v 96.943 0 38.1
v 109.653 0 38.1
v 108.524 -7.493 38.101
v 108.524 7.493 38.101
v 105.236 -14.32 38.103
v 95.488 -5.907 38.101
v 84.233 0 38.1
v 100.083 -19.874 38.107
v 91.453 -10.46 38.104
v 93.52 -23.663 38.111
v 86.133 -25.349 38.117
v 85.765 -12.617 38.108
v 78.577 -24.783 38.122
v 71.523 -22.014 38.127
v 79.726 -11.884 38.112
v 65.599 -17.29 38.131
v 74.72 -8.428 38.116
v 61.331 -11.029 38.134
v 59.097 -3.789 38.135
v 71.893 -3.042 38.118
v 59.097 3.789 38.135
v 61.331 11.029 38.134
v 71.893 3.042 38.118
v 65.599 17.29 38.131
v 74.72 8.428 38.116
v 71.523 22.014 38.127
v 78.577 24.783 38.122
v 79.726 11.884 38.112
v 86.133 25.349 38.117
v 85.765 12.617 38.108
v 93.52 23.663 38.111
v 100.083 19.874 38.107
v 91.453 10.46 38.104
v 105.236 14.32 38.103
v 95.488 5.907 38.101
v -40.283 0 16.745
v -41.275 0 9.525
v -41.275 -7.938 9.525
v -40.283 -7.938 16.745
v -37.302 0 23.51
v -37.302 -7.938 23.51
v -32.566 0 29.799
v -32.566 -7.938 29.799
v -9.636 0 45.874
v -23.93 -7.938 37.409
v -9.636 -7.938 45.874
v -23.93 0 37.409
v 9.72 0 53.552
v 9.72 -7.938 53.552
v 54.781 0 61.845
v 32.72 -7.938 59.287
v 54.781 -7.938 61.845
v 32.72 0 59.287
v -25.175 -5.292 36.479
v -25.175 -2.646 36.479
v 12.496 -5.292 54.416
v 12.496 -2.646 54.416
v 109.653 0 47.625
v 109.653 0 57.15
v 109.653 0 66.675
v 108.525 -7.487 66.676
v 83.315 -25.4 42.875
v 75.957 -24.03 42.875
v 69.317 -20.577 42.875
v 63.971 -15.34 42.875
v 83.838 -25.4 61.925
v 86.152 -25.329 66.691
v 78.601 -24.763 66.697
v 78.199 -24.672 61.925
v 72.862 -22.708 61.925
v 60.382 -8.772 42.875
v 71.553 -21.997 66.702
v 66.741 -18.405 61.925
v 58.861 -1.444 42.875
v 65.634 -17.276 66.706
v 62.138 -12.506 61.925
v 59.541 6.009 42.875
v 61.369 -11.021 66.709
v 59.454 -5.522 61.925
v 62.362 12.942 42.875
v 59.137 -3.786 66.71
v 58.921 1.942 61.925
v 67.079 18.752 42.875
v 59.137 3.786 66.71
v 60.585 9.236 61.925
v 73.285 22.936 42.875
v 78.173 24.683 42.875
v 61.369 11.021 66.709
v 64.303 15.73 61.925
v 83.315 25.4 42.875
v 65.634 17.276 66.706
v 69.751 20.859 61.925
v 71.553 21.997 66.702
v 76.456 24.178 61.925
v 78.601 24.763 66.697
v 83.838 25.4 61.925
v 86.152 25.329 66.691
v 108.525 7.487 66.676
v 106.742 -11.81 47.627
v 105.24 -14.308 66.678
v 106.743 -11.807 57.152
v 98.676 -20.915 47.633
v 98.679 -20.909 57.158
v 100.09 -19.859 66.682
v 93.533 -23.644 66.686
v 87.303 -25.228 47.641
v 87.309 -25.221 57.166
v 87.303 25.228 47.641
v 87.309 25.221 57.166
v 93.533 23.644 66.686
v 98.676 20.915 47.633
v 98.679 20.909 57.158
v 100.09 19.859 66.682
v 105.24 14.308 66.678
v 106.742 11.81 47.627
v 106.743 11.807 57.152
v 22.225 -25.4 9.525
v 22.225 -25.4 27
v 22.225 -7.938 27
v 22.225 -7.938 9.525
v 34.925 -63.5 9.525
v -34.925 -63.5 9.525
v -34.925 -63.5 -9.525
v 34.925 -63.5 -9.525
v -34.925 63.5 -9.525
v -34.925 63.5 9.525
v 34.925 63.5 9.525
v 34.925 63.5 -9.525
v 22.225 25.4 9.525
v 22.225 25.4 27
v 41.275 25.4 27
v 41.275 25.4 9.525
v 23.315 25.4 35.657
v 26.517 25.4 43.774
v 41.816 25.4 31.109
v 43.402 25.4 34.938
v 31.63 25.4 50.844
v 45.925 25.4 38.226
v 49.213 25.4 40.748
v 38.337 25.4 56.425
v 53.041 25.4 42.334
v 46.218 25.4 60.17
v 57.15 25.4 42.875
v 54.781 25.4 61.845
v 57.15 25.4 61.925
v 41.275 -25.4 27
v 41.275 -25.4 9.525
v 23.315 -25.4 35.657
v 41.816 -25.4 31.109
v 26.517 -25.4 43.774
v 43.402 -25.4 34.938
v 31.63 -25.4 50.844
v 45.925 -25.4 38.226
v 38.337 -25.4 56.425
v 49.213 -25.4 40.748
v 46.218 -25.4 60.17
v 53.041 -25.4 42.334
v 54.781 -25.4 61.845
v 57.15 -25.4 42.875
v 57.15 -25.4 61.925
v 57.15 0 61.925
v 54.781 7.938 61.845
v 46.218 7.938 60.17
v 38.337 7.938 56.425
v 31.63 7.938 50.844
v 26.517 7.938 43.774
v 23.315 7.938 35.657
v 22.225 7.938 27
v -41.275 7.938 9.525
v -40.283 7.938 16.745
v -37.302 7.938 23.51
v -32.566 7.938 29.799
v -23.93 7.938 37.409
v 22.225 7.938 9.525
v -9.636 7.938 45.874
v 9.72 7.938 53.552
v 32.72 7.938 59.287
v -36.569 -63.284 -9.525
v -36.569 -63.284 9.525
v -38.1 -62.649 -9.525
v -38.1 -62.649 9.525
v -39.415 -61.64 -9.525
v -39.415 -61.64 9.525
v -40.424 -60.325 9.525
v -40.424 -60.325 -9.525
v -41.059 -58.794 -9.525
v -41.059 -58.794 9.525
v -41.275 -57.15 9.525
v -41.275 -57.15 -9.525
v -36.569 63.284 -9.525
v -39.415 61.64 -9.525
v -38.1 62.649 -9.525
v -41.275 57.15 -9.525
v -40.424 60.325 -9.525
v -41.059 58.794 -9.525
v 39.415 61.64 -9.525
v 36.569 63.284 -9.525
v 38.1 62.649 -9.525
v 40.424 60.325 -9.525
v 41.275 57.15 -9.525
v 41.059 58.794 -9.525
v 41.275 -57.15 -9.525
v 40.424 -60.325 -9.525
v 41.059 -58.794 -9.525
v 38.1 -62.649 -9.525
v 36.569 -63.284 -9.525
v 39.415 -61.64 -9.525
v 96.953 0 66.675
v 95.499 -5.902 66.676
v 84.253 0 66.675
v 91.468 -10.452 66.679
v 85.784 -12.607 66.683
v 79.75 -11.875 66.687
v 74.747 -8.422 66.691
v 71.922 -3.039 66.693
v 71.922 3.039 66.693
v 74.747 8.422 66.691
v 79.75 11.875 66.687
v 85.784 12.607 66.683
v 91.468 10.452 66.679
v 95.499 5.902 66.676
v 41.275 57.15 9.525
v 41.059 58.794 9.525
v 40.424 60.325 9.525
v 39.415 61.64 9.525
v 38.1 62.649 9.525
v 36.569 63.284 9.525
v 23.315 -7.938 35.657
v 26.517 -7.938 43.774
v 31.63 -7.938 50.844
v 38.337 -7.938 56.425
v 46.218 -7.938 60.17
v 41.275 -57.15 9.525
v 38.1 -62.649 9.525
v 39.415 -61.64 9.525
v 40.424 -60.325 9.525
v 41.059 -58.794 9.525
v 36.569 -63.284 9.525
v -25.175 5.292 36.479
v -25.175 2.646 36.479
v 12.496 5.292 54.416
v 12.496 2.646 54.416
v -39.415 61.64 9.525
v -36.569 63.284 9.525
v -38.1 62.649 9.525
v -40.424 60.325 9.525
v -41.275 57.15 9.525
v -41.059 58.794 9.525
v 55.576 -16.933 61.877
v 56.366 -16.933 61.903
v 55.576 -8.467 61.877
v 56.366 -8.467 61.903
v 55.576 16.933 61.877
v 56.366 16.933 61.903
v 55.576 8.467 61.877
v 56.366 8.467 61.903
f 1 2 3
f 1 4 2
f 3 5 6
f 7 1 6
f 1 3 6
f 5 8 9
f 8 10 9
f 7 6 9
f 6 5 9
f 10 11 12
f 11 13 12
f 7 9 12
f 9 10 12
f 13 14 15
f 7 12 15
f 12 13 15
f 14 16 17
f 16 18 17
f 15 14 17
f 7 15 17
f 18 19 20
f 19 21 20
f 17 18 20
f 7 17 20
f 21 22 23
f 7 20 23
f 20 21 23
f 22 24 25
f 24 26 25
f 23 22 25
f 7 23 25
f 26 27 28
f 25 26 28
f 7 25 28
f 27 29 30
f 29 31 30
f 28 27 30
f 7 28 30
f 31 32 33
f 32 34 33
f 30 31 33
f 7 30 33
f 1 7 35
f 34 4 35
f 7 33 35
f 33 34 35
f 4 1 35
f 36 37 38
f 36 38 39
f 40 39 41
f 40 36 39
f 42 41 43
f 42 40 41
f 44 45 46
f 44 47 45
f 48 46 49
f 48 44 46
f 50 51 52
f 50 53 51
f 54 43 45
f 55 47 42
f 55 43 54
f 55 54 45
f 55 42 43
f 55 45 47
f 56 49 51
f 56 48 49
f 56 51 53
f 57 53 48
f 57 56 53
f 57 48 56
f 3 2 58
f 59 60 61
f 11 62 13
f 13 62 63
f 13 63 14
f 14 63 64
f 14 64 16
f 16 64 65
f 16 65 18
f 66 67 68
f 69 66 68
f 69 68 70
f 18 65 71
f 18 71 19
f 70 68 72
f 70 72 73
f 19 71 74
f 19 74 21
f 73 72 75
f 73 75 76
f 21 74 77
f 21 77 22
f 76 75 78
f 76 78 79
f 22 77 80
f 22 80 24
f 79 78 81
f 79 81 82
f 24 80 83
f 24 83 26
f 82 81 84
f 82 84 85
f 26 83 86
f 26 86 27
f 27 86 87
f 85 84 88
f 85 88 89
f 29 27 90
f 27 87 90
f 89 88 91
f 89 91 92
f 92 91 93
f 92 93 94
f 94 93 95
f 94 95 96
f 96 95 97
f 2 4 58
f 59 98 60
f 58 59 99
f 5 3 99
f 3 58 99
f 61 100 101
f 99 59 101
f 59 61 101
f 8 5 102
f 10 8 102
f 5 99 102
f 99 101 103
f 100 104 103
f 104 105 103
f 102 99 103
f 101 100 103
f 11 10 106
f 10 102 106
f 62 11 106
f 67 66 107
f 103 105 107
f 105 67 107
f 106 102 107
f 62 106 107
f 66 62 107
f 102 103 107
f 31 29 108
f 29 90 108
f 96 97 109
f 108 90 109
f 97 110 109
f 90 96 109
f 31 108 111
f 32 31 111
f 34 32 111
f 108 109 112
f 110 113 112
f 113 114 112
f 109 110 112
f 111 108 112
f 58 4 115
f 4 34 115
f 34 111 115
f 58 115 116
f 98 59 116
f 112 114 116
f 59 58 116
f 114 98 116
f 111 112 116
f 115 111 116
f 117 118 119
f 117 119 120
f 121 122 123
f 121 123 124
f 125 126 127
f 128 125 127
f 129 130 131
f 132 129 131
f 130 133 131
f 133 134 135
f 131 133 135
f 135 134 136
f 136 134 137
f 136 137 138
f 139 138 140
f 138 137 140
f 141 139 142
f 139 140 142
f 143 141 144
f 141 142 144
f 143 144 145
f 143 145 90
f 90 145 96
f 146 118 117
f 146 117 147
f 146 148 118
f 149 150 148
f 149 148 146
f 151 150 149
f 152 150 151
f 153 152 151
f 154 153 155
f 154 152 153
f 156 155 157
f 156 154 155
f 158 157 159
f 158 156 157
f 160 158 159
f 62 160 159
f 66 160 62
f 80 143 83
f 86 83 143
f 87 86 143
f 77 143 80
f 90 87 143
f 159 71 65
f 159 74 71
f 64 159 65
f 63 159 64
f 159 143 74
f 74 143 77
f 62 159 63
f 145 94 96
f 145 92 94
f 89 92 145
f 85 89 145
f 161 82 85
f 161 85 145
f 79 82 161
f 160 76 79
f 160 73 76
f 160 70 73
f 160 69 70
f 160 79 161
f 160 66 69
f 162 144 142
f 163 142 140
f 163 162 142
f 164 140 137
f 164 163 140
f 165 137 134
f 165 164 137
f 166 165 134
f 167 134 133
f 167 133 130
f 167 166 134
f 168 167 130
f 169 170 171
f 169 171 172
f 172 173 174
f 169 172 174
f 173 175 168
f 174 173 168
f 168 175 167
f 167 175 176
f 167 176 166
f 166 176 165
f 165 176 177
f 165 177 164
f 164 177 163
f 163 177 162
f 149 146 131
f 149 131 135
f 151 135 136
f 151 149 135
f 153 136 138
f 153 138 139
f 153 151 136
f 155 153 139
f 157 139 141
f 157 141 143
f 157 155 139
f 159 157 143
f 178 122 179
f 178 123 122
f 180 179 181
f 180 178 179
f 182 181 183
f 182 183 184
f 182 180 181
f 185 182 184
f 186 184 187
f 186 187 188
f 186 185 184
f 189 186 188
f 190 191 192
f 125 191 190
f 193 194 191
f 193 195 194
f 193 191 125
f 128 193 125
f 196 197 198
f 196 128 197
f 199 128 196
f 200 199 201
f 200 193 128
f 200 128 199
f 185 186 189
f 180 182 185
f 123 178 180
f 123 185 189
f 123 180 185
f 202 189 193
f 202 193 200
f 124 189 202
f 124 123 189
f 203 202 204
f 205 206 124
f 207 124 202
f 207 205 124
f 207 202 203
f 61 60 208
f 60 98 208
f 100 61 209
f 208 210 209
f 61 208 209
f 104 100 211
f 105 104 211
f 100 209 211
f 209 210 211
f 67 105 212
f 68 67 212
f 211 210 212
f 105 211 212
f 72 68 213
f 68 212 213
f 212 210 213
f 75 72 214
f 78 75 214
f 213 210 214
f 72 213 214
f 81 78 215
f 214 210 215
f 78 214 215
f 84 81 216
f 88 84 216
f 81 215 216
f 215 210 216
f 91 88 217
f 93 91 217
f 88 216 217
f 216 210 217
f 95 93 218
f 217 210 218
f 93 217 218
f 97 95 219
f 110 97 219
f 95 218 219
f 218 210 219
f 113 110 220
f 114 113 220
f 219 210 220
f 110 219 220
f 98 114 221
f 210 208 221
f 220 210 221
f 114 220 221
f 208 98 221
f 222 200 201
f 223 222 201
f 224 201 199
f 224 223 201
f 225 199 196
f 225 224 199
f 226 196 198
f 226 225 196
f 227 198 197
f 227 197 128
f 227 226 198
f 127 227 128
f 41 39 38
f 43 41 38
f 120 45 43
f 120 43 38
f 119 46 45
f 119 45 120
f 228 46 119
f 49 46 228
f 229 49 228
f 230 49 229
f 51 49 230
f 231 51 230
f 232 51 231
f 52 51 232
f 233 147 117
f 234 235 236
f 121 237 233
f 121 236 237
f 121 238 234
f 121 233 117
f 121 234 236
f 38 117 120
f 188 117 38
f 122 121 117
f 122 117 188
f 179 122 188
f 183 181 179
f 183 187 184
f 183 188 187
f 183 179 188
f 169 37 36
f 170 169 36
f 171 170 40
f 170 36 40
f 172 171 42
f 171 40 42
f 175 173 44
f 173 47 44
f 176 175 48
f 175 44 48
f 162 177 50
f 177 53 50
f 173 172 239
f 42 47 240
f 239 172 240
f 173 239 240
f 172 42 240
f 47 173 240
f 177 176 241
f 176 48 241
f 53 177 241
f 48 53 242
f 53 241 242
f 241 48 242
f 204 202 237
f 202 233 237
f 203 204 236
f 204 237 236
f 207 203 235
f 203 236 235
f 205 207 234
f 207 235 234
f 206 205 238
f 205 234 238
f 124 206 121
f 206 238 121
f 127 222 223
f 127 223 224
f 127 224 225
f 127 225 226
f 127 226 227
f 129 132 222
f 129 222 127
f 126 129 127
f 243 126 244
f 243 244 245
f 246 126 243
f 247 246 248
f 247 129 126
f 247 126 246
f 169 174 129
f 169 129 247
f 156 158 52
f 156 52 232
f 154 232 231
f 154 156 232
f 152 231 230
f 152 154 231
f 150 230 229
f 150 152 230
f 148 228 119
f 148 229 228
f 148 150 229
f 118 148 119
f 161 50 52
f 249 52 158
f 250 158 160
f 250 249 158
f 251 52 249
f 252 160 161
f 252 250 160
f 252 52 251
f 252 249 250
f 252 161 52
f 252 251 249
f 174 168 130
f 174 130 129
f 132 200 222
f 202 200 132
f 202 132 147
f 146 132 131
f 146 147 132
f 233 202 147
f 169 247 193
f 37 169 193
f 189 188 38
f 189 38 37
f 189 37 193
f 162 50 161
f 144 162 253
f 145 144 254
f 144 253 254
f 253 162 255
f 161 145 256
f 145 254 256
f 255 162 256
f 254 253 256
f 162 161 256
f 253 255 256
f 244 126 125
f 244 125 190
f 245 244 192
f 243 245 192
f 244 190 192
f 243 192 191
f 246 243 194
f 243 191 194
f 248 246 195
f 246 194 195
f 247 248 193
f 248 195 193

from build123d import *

# Parameters (mm, degrees)
F1_DEPTH = 63.5
F0_W     = 25.3799454411
F0_H     = 19.05
F2_DEPTH = 25.4
F3_DEPTH = 7.9375
F5_R     = 6.35


with BuildPart() as f1:
    # F0 (on Front) → F1 (new body, symmetric)
    with BuildSketch(Plane.XZ):
        Polygon((41.275, -9.525), (41.275, 9.525), (22.225, 9.525), (-41.275, 9.525), (-41.275, -9.525), align=None)
    extrude(amount=F1_DEPTH, both=True)

    # F0 (on Front) → F2 (join, symmetric)
    with BuildSketch(Plane.XZ):
        with BuildLine():
            Line((22.225, 9.525), (41.275, 9.525))
            Line((41.275, 9.525), (41.275, 27.0002))
            ThreePointArc((41.275, 27.0002), (45.9246798487, 38.2255201513), (57.15, 42.8752))
            Line((57.15, 42.8752), (58.853423, 42.8752))
            Line((58.853423, 42.8752), (58.853423, 61.9252))
            Line((58.853423, 61.9252), (57.15, 61.9252))
            add(Edge.make_bspline(
                [(54.7810867094, 61.8447673645), (55.5787107168, 61.8791484879), (56.3685670715, 61.9059785826), (57.15, 61.9252)],
                knots=[109.2664103078, 109.2664103078, 109.2664103078, 109.2664103078, 111.5045361635, 111.5045361635, 111.5045361635, 111.5045361635], degree=3))
            ThreePointArc((54.7810867094, 61.8447673645), (31.6304984211, 50.8436616648), (22.225, 27.0002))
            Line((22.225, 27.0002), (22.225, 9.525))
        make_face()
        with Locations((71.5433957206, 52.4002)):
            Rectangle(F0_W, F0_H)
    extrude(amount=F2_DEPTH, both=True)

    # F0 (on Front) → F3 (join, symmetric)
    with BuildSketch(Plane.XZ):
        with BuildLine():
            Line((-41.275, 9.525), (22.225, 9.525))
            Line((22.225, 9.525), (22.225, 27.0002))
            ThreePointArc((22.225, 27.0002), (31.6304984211, 50.8436616648), (54.7810867094, 61.8447673645))
            add(Edge.make_bspline(
                [(-41.275, 9.525), (-41.6134486644, 40.4903317988), (15.8406885003, 60.1662639324), (54.7810867094, 61.8447673645)],
                knots=[0, 0, 0, 0, 109.2664103078, 109.2664103078, 109.2664103078, 109.2664103078], degree=3))
        make_face()
    extrude(amount=F3_DEPTH, both=True)

    # F0 (on Front) → F4 (revolve)
    with BuildSketch(Plane.XZ):
        Polygon((84.253423, 66.675), (84.2333684411, 38.1), (109.653423, 38.1), (109.653423, 66.675), align=None)
    revolve(axis=Axis((84.2433957206, 0, 52.3875), (-0.0007018217, 0, -0.9999997537)))

    # F5
    f5_edges = [f1.edges().sort_by_distance(p)[0] for p in [
        (41.275, -63.5, 0),
        (41.275, 63.5, 0),
        (-41.275, 63.5, 0),
        (-41.275, -63.5, 0),
    ]]
    fillet(f5_edges, radius=F5_R)


solid = f1.part
